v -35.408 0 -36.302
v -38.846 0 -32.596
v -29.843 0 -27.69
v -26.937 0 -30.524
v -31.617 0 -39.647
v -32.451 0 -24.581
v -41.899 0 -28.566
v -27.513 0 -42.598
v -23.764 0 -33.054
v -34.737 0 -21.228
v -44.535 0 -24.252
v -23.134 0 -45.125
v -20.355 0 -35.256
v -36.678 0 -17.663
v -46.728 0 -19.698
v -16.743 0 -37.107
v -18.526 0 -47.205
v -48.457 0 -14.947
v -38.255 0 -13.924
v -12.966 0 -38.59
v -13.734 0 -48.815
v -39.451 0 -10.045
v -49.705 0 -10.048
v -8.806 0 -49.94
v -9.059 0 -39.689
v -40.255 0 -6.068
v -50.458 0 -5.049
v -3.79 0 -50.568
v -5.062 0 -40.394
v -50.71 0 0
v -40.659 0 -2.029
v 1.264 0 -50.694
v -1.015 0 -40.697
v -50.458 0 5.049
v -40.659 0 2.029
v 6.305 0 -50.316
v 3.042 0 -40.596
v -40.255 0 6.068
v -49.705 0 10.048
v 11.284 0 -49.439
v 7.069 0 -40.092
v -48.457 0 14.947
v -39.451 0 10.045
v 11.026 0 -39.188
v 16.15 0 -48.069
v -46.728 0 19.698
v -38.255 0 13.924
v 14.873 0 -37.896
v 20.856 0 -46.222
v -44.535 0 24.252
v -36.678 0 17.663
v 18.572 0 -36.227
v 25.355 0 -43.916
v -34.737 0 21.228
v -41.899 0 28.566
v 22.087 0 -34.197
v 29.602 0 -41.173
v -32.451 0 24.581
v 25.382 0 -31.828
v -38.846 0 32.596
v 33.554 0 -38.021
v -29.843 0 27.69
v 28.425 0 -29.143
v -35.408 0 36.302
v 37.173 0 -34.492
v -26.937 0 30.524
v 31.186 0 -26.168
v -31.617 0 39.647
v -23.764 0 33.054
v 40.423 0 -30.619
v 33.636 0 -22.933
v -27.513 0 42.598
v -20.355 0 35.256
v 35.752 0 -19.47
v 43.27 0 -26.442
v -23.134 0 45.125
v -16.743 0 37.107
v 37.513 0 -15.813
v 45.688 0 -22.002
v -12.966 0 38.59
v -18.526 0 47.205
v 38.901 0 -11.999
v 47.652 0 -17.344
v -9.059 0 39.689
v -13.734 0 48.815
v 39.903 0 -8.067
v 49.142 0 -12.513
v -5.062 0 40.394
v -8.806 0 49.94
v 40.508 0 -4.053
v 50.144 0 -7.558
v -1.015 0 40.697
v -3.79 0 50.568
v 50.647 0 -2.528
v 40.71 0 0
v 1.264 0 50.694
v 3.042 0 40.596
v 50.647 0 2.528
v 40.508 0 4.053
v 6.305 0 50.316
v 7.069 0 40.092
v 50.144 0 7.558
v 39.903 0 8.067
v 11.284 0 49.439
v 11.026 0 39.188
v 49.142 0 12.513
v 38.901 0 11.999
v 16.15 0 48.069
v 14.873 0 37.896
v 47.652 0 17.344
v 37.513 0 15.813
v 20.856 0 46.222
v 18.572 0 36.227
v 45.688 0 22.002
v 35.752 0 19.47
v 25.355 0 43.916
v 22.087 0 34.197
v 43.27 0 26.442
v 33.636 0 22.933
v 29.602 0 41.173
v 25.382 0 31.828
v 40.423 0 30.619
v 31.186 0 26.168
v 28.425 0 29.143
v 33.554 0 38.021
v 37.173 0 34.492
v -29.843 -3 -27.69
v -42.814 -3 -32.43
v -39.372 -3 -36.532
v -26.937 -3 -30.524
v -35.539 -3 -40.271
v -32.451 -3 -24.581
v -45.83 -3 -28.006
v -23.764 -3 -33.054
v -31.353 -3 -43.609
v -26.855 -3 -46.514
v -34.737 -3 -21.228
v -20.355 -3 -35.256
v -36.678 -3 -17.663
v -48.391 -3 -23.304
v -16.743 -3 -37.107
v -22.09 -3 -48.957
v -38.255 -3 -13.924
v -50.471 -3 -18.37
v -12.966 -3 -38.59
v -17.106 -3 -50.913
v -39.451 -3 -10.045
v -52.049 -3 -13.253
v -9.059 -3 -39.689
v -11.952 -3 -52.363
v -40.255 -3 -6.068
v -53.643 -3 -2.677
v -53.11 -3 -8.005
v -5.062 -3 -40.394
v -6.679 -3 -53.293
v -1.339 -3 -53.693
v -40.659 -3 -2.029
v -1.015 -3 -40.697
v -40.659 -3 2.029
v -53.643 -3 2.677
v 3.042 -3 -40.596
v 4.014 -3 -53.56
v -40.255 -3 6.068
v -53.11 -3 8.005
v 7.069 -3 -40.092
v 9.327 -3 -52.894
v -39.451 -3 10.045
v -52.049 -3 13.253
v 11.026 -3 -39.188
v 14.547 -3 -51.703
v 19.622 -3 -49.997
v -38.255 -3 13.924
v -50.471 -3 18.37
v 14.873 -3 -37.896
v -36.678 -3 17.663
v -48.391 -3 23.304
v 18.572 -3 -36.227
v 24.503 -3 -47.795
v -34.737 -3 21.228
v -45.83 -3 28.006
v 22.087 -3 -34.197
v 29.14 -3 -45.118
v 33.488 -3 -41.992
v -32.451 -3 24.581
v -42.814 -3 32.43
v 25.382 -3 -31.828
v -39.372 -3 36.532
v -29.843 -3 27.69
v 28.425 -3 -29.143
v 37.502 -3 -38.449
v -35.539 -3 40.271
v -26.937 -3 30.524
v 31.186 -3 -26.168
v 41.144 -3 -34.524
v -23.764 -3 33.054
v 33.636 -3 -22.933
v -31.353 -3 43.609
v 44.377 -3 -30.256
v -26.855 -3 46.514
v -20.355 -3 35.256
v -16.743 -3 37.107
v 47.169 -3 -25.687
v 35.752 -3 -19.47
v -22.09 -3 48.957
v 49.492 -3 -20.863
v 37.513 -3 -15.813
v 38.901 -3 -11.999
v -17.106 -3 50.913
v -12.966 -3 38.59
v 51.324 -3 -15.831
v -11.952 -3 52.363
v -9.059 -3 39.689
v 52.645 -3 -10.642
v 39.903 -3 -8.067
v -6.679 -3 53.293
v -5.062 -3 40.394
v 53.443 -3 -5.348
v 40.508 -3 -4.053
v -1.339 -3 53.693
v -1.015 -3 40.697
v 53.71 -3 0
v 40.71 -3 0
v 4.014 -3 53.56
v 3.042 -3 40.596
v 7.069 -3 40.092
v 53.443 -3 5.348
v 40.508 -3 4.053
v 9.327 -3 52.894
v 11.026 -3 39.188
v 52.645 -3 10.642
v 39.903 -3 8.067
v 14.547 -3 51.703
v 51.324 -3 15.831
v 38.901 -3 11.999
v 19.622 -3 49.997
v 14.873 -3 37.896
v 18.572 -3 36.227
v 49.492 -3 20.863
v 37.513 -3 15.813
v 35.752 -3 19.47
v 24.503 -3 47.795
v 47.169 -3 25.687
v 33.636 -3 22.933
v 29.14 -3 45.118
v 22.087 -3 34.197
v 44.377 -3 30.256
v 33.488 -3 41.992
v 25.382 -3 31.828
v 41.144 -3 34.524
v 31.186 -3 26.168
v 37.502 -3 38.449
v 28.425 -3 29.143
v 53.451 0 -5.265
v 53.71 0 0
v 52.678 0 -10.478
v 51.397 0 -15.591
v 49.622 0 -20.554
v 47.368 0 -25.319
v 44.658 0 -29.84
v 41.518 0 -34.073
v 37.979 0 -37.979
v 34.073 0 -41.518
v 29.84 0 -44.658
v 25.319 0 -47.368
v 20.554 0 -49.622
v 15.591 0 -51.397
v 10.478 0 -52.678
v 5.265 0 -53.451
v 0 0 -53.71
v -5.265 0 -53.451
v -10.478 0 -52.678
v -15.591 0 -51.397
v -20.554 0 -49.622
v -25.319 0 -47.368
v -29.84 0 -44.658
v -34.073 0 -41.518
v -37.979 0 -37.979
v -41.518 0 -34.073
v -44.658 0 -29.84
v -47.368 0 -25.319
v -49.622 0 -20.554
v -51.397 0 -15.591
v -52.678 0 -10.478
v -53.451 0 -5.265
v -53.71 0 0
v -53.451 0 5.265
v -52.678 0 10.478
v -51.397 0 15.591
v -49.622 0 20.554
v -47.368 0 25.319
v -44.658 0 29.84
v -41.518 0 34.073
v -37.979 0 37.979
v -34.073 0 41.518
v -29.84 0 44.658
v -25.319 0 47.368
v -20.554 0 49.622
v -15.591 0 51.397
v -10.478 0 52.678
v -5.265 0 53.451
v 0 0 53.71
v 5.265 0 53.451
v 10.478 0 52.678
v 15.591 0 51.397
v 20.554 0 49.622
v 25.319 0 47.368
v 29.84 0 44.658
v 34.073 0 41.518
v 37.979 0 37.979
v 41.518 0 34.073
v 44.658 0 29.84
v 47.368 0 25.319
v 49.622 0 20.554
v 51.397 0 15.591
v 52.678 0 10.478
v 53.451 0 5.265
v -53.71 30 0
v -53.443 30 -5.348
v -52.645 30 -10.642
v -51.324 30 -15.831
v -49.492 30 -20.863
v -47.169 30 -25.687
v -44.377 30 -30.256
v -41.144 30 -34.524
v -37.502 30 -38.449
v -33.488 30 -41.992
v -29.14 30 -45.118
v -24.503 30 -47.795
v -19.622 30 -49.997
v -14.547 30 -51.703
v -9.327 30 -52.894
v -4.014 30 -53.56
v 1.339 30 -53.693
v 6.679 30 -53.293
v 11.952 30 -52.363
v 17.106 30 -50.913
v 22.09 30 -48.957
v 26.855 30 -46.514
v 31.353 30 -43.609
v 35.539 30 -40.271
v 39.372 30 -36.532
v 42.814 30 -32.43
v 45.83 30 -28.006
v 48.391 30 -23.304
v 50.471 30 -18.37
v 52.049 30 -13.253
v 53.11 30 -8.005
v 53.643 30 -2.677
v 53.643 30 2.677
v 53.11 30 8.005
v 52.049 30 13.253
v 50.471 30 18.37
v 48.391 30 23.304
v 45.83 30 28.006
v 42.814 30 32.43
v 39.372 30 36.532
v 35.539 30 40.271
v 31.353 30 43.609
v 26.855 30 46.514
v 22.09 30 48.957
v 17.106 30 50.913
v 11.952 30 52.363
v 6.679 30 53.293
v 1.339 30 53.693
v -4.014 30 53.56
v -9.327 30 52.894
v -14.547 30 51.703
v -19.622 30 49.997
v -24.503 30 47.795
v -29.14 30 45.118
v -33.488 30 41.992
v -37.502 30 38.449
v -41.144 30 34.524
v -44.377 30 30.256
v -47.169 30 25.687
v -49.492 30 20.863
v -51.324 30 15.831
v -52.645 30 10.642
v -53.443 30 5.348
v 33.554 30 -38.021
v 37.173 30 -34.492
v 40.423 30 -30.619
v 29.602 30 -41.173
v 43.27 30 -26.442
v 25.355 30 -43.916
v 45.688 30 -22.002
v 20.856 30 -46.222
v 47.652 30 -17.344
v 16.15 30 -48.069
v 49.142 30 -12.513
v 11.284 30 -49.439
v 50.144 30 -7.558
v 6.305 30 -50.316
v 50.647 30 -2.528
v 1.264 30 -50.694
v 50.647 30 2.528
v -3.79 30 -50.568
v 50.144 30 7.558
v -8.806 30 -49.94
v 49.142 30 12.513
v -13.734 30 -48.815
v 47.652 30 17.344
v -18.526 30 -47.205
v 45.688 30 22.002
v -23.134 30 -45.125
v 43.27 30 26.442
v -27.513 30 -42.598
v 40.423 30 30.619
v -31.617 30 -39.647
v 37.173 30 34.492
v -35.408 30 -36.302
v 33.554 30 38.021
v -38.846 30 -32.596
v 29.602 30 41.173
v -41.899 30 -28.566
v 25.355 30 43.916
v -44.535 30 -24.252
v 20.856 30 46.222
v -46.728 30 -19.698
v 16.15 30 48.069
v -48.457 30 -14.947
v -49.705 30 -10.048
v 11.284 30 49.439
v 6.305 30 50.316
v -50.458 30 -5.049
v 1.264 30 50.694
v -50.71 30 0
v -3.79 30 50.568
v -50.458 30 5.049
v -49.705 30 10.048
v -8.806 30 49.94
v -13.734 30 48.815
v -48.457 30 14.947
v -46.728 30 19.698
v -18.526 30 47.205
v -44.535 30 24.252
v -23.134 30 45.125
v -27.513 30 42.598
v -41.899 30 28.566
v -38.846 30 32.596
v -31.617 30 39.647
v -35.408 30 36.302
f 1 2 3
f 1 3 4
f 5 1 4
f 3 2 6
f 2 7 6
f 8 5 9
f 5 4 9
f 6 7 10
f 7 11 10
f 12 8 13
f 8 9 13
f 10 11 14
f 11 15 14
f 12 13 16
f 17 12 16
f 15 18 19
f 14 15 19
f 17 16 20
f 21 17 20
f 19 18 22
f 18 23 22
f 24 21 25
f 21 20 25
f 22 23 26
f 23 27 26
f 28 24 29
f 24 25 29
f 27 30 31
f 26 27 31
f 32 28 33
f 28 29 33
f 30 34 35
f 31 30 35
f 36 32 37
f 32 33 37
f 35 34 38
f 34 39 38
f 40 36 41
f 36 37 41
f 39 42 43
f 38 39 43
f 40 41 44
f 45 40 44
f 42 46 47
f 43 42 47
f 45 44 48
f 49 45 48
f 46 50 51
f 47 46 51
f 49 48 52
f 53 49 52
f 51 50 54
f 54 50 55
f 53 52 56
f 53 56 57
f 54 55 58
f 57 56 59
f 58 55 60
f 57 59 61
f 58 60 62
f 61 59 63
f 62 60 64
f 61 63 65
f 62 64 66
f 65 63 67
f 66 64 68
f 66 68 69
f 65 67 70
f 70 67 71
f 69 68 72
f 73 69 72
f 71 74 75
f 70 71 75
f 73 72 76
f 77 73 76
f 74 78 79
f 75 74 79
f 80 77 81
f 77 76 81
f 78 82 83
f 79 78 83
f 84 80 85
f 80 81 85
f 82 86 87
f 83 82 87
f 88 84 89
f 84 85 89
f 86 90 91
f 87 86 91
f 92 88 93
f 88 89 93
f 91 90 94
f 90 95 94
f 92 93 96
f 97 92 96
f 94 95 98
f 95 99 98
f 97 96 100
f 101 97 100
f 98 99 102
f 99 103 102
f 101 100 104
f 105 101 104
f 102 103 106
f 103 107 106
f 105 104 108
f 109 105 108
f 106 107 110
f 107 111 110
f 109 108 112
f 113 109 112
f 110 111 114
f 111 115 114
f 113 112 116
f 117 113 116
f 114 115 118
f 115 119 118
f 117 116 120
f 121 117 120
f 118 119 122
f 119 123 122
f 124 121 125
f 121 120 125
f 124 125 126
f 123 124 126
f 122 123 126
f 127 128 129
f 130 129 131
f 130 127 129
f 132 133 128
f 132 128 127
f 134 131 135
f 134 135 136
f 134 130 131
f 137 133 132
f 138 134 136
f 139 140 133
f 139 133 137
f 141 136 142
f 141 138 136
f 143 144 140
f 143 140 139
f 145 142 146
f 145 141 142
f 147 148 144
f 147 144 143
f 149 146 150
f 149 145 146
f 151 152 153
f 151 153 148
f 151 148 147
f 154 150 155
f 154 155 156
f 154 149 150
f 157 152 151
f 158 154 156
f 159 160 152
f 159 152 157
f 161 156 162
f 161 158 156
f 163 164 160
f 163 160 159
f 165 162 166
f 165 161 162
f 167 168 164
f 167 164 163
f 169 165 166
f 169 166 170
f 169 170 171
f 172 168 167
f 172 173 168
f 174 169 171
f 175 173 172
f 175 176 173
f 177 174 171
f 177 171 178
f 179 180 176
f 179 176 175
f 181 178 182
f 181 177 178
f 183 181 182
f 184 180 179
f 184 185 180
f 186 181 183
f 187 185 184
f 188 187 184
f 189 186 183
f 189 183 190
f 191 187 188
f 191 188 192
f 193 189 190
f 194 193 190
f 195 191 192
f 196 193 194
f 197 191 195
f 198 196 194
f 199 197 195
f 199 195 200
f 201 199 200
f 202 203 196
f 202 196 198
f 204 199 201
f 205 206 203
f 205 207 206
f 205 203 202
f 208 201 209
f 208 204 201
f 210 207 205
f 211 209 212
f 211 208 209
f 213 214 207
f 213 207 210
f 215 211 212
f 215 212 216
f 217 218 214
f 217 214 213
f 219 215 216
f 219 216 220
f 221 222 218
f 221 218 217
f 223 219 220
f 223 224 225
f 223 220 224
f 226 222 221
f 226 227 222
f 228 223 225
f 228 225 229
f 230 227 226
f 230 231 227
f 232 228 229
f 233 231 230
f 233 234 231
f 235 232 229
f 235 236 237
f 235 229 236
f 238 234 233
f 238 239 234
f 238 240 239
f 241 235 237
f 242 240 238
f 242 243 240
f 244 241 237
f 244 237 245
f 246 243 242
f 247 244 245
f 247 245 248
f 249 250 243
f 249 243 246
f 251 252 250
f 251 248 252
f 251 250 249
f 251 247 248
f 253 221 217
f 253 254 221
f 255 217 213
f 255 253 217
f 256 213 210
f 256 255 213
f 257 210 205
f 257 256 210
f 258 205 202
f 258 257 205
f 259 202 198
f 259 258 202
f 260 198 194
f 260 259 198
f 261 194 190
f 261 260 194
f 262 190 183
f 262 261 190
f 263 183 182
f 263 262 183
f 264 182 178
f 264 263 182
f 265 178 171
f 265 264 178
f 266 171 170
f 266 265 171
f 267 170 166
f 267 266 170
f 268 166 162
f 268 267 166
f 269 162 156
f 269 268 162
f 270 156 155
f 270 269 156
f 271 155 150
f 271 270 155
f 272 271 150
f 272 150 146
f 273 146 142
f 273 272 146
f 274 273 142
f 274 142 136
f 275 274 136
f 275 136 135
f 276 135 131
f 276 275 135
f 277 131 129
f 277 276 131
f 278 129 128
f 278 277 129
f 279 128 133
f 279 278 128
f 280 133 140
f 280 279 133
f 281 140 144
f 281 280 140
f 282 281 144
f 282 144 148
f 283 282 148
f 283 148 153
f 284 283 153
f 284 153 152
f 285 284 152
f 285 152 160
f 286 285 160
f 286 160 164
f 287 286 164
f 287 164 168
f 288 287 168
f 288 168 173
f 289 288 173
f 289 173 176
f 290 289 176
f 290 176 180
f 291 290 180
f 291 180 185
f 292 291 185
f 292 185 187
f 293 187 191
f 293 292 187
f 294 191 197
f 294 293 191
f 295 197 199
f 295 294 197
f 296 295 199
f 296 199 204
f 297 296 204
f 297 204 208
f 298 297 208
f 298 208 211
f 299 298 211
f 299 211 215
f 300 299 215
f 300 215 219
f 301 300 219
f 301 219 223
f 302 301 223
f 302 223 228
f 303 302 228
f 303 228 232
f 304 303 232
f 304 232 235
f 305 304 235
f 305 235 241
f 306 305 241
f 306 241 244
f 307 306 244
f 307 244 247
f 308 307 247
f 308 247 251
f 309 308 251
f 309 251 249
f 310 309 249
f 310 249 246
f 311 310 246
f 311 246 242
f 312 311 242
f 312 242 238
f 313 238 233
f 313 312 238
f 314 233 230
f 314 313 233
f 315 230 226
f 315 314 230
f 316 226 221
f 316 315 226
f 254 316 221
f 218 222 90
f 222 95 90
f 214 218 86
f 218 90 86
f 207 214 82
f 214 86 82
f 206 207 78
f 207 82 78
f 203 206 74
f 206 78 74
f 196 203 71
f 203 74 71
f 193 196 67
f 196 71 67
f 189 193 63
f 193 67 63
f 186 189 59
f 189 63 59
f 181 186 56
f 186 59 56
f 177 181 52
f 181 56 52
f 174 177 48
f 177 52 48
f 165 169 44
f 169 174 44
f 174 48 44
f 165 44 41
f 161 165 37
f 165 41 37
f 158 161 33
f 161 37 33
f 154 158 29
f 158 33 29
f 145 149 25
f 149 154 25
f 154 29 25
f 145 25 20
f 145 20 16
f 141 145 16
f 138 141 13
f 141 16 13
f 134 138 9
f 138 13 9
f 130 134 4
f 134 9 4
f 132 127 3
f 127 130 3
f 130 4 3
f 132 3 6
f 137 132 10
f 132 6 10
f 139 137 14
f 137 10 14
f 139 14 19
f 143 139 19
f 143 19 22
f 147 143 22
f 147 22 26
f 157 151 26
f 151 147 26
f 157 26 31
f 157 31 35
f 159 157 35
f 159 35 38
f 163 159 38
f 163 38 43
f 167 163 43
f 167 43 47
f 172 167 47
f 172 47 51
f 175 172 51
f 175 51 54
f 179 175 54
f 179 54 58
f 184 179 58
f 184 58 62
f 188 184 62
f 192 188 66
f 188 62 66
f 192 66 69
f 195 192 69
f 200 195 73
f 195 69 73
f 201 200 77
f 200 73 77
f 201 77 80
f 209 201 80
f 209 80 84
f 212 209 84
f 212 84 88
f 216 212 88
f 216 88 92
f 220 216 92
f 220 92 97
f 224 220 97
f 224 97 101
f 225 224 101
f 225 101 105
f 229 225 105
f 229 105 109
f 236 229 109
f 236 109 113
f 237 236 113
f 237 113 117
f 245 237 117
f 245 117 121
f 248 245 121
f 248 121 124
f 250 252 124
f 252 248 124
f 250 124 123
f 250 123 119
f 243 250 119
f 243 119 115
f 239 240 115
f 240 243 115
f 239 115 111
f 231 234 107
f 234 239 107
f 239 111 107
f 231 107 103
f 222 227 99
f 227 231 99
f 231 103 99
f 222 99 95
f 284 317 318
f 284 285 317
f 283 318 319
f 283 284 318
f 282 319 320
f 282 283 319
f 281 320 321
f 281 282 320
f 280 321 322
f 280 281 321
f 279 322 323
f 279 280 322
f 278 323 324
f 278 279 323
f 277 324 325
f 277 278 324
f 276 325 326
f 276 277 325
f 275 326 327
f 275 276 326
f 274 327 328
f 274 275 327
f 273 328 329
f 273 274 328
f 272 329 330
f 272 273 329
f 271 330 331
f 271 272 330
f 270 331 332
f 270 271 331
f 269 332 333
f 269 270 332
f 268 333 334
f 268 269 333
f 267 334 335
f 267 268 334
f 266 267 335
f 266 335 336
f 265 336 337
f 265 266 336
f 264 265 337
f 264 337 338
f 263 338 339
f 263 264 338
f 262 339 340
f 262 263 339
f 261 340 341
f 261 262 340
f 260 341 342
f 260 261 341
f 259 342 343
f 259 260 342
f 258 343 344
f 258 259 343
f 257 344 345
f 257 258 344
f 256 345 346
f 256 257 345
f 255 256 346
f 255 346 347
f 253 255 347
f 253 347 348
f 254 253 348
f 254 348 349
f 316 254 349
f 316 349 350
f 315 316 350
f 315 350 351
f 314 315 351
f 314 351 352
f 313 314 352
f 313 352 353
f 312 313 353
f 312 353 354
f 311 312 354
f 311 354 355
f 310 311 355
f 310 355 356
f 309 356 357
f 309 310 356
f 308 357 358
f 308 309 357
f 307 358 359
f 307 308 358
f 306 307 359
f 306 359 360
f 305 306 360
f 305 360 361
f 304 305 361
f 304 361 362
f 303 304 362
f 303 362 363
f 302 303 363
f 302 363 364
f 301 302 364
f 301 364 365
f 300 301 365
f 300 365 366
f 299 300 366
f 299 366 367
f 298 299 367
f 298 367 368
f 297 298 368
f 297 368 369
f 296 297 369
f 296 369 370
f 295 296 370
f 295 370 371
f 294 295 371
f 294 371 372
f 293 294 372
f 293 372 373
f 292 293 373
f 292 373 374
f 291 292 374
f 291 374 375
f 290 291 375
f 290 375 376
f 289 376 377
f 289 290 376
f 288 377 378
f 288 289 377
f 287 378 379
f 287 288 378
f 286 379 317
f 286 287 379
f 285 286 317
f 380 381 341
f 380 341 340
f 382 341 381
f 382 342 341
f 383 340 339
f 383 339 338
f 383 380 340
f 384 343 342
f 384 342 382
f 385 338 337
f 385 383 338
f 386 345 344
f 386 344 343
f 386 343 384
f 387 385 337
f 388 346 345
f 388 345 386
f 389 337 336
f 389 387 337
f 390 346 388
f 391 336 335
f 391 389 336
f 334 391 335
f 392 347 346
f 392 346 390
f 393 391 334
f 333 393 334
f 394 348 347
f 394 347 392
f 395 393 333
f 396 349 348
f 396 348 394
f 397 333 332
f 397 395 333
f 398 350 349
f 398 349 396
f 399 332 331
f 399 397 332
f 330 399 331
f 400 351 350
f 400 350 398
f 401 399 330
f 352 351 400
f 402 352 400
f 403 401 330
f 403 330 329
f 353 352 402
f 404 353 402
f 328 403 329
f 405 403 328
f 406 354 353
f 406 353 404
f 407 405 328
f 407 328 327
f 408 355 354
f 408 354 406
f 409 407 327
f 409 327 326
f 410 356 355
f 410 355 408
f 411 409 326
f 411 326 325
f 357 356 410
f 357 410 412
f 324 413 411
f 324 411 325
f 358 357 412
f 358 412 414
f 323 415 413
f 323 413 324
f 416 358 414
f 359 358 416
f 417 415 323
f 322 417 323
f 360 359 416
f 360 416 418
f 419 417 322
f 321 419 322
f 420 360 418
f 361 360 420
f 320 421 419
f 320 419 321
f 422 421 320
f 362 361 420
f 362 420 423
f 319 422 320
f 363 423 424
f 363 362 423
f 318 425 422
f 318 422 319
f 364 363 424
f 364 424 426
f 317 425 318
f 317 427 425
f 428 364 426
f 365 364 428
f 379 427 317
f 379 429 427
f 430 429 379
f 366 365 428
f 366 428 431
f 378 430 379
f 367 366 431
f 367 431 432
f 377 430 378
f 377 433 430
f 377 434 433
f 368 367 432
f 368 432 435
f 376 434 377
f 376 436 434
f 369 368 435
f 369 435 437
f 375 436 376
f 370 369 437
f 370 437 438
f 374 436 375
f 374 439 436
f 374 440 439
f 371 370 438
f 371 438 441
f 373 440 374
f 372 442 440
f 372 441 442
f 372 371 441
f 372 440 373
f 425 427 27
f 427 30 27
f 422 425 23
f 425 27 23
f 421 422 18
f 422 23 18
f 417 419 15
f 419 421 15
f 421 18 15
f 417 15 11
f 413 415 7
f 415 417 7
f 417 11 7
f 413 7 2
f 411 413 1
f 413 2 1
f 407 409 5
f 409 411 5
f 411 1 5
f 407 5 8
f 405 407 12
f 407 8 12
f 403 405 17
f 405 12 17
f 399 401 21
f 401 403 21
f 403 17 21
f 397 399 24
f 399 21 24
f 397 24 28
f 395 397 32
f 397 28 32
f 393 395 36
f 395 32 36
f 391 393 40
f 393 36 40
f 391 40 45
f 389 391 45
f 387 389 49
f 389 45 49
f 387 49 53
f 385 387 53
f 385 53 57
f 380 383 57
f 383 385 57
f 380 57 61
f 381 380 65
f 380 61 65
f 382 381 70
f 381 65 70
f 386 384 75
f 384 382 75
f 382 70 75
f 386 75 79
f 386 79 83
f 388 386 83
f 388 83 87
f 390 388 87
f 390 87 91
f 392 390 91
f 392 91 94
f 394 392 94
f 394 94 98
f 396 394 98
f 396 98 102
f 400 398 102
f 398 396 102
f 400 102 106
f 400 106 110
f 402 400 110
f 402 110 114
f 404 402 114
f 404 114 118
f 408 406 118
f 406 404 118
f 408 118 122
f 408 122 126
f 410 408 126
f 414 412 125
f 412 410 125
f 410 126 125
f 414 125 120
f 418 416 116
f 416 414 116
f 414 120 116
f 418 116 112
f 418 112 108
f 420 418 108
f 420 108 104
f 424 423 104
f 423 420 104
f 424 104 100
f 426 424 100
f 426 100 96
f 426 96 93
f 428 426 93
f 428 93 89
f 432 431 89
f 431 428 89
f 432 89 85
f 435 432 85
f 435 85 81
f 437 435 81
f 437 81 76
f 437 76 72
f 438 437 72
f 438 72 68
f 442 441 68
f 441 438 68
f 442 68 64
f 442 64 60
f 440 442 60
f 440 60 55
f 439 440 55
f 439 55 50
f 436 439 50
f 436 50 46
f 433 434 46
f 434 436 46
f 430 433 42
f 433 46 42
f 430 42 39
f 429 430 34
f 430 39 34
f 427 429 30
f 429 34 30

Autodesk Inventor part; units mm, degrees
ref_plane "YZ Plane" through (0, 0, 0) normal (1, 0, 0) x (0, 1, 0)
ref_plane "XZ Plane" through (0, 0, 0) normal (0, 1, 0) x (-1, 0, 0)
ref_plane "XY Plane" through (0, 0, 0) normal (0, 0, 1) x (1, 0, 0)
sketch "Sketch1" plane through (0, 0, 0) normal (0, 1, 0) x (-1, 0, 0)
  circle A0 centre (0, 0) radius 53.71
  circle A1 centre (0, 0) radius 50.71
  dimension "d0" = 107.42
  dimension "d1" = 3
extrude "Extrusion1" add sketch "Sketch1" along normal blind 30
sketch "Sketch2" plane through (0, 0, 0) normal (0, -1, 0) x (1, 0, 0)
  circle A0 centre (0, 0) radius 53.71 projected
  circle A1 centre (0, 0) radius 50.71 projected
  circle A2 centre (0, 0) radius 40.71
  dimension "d5" = 10
extrude "Extrusion2" add sketch "Sketch2" along normal blind 3 contours A0 | A1
properties part number "12mm-CoilForm-Stiffner"
